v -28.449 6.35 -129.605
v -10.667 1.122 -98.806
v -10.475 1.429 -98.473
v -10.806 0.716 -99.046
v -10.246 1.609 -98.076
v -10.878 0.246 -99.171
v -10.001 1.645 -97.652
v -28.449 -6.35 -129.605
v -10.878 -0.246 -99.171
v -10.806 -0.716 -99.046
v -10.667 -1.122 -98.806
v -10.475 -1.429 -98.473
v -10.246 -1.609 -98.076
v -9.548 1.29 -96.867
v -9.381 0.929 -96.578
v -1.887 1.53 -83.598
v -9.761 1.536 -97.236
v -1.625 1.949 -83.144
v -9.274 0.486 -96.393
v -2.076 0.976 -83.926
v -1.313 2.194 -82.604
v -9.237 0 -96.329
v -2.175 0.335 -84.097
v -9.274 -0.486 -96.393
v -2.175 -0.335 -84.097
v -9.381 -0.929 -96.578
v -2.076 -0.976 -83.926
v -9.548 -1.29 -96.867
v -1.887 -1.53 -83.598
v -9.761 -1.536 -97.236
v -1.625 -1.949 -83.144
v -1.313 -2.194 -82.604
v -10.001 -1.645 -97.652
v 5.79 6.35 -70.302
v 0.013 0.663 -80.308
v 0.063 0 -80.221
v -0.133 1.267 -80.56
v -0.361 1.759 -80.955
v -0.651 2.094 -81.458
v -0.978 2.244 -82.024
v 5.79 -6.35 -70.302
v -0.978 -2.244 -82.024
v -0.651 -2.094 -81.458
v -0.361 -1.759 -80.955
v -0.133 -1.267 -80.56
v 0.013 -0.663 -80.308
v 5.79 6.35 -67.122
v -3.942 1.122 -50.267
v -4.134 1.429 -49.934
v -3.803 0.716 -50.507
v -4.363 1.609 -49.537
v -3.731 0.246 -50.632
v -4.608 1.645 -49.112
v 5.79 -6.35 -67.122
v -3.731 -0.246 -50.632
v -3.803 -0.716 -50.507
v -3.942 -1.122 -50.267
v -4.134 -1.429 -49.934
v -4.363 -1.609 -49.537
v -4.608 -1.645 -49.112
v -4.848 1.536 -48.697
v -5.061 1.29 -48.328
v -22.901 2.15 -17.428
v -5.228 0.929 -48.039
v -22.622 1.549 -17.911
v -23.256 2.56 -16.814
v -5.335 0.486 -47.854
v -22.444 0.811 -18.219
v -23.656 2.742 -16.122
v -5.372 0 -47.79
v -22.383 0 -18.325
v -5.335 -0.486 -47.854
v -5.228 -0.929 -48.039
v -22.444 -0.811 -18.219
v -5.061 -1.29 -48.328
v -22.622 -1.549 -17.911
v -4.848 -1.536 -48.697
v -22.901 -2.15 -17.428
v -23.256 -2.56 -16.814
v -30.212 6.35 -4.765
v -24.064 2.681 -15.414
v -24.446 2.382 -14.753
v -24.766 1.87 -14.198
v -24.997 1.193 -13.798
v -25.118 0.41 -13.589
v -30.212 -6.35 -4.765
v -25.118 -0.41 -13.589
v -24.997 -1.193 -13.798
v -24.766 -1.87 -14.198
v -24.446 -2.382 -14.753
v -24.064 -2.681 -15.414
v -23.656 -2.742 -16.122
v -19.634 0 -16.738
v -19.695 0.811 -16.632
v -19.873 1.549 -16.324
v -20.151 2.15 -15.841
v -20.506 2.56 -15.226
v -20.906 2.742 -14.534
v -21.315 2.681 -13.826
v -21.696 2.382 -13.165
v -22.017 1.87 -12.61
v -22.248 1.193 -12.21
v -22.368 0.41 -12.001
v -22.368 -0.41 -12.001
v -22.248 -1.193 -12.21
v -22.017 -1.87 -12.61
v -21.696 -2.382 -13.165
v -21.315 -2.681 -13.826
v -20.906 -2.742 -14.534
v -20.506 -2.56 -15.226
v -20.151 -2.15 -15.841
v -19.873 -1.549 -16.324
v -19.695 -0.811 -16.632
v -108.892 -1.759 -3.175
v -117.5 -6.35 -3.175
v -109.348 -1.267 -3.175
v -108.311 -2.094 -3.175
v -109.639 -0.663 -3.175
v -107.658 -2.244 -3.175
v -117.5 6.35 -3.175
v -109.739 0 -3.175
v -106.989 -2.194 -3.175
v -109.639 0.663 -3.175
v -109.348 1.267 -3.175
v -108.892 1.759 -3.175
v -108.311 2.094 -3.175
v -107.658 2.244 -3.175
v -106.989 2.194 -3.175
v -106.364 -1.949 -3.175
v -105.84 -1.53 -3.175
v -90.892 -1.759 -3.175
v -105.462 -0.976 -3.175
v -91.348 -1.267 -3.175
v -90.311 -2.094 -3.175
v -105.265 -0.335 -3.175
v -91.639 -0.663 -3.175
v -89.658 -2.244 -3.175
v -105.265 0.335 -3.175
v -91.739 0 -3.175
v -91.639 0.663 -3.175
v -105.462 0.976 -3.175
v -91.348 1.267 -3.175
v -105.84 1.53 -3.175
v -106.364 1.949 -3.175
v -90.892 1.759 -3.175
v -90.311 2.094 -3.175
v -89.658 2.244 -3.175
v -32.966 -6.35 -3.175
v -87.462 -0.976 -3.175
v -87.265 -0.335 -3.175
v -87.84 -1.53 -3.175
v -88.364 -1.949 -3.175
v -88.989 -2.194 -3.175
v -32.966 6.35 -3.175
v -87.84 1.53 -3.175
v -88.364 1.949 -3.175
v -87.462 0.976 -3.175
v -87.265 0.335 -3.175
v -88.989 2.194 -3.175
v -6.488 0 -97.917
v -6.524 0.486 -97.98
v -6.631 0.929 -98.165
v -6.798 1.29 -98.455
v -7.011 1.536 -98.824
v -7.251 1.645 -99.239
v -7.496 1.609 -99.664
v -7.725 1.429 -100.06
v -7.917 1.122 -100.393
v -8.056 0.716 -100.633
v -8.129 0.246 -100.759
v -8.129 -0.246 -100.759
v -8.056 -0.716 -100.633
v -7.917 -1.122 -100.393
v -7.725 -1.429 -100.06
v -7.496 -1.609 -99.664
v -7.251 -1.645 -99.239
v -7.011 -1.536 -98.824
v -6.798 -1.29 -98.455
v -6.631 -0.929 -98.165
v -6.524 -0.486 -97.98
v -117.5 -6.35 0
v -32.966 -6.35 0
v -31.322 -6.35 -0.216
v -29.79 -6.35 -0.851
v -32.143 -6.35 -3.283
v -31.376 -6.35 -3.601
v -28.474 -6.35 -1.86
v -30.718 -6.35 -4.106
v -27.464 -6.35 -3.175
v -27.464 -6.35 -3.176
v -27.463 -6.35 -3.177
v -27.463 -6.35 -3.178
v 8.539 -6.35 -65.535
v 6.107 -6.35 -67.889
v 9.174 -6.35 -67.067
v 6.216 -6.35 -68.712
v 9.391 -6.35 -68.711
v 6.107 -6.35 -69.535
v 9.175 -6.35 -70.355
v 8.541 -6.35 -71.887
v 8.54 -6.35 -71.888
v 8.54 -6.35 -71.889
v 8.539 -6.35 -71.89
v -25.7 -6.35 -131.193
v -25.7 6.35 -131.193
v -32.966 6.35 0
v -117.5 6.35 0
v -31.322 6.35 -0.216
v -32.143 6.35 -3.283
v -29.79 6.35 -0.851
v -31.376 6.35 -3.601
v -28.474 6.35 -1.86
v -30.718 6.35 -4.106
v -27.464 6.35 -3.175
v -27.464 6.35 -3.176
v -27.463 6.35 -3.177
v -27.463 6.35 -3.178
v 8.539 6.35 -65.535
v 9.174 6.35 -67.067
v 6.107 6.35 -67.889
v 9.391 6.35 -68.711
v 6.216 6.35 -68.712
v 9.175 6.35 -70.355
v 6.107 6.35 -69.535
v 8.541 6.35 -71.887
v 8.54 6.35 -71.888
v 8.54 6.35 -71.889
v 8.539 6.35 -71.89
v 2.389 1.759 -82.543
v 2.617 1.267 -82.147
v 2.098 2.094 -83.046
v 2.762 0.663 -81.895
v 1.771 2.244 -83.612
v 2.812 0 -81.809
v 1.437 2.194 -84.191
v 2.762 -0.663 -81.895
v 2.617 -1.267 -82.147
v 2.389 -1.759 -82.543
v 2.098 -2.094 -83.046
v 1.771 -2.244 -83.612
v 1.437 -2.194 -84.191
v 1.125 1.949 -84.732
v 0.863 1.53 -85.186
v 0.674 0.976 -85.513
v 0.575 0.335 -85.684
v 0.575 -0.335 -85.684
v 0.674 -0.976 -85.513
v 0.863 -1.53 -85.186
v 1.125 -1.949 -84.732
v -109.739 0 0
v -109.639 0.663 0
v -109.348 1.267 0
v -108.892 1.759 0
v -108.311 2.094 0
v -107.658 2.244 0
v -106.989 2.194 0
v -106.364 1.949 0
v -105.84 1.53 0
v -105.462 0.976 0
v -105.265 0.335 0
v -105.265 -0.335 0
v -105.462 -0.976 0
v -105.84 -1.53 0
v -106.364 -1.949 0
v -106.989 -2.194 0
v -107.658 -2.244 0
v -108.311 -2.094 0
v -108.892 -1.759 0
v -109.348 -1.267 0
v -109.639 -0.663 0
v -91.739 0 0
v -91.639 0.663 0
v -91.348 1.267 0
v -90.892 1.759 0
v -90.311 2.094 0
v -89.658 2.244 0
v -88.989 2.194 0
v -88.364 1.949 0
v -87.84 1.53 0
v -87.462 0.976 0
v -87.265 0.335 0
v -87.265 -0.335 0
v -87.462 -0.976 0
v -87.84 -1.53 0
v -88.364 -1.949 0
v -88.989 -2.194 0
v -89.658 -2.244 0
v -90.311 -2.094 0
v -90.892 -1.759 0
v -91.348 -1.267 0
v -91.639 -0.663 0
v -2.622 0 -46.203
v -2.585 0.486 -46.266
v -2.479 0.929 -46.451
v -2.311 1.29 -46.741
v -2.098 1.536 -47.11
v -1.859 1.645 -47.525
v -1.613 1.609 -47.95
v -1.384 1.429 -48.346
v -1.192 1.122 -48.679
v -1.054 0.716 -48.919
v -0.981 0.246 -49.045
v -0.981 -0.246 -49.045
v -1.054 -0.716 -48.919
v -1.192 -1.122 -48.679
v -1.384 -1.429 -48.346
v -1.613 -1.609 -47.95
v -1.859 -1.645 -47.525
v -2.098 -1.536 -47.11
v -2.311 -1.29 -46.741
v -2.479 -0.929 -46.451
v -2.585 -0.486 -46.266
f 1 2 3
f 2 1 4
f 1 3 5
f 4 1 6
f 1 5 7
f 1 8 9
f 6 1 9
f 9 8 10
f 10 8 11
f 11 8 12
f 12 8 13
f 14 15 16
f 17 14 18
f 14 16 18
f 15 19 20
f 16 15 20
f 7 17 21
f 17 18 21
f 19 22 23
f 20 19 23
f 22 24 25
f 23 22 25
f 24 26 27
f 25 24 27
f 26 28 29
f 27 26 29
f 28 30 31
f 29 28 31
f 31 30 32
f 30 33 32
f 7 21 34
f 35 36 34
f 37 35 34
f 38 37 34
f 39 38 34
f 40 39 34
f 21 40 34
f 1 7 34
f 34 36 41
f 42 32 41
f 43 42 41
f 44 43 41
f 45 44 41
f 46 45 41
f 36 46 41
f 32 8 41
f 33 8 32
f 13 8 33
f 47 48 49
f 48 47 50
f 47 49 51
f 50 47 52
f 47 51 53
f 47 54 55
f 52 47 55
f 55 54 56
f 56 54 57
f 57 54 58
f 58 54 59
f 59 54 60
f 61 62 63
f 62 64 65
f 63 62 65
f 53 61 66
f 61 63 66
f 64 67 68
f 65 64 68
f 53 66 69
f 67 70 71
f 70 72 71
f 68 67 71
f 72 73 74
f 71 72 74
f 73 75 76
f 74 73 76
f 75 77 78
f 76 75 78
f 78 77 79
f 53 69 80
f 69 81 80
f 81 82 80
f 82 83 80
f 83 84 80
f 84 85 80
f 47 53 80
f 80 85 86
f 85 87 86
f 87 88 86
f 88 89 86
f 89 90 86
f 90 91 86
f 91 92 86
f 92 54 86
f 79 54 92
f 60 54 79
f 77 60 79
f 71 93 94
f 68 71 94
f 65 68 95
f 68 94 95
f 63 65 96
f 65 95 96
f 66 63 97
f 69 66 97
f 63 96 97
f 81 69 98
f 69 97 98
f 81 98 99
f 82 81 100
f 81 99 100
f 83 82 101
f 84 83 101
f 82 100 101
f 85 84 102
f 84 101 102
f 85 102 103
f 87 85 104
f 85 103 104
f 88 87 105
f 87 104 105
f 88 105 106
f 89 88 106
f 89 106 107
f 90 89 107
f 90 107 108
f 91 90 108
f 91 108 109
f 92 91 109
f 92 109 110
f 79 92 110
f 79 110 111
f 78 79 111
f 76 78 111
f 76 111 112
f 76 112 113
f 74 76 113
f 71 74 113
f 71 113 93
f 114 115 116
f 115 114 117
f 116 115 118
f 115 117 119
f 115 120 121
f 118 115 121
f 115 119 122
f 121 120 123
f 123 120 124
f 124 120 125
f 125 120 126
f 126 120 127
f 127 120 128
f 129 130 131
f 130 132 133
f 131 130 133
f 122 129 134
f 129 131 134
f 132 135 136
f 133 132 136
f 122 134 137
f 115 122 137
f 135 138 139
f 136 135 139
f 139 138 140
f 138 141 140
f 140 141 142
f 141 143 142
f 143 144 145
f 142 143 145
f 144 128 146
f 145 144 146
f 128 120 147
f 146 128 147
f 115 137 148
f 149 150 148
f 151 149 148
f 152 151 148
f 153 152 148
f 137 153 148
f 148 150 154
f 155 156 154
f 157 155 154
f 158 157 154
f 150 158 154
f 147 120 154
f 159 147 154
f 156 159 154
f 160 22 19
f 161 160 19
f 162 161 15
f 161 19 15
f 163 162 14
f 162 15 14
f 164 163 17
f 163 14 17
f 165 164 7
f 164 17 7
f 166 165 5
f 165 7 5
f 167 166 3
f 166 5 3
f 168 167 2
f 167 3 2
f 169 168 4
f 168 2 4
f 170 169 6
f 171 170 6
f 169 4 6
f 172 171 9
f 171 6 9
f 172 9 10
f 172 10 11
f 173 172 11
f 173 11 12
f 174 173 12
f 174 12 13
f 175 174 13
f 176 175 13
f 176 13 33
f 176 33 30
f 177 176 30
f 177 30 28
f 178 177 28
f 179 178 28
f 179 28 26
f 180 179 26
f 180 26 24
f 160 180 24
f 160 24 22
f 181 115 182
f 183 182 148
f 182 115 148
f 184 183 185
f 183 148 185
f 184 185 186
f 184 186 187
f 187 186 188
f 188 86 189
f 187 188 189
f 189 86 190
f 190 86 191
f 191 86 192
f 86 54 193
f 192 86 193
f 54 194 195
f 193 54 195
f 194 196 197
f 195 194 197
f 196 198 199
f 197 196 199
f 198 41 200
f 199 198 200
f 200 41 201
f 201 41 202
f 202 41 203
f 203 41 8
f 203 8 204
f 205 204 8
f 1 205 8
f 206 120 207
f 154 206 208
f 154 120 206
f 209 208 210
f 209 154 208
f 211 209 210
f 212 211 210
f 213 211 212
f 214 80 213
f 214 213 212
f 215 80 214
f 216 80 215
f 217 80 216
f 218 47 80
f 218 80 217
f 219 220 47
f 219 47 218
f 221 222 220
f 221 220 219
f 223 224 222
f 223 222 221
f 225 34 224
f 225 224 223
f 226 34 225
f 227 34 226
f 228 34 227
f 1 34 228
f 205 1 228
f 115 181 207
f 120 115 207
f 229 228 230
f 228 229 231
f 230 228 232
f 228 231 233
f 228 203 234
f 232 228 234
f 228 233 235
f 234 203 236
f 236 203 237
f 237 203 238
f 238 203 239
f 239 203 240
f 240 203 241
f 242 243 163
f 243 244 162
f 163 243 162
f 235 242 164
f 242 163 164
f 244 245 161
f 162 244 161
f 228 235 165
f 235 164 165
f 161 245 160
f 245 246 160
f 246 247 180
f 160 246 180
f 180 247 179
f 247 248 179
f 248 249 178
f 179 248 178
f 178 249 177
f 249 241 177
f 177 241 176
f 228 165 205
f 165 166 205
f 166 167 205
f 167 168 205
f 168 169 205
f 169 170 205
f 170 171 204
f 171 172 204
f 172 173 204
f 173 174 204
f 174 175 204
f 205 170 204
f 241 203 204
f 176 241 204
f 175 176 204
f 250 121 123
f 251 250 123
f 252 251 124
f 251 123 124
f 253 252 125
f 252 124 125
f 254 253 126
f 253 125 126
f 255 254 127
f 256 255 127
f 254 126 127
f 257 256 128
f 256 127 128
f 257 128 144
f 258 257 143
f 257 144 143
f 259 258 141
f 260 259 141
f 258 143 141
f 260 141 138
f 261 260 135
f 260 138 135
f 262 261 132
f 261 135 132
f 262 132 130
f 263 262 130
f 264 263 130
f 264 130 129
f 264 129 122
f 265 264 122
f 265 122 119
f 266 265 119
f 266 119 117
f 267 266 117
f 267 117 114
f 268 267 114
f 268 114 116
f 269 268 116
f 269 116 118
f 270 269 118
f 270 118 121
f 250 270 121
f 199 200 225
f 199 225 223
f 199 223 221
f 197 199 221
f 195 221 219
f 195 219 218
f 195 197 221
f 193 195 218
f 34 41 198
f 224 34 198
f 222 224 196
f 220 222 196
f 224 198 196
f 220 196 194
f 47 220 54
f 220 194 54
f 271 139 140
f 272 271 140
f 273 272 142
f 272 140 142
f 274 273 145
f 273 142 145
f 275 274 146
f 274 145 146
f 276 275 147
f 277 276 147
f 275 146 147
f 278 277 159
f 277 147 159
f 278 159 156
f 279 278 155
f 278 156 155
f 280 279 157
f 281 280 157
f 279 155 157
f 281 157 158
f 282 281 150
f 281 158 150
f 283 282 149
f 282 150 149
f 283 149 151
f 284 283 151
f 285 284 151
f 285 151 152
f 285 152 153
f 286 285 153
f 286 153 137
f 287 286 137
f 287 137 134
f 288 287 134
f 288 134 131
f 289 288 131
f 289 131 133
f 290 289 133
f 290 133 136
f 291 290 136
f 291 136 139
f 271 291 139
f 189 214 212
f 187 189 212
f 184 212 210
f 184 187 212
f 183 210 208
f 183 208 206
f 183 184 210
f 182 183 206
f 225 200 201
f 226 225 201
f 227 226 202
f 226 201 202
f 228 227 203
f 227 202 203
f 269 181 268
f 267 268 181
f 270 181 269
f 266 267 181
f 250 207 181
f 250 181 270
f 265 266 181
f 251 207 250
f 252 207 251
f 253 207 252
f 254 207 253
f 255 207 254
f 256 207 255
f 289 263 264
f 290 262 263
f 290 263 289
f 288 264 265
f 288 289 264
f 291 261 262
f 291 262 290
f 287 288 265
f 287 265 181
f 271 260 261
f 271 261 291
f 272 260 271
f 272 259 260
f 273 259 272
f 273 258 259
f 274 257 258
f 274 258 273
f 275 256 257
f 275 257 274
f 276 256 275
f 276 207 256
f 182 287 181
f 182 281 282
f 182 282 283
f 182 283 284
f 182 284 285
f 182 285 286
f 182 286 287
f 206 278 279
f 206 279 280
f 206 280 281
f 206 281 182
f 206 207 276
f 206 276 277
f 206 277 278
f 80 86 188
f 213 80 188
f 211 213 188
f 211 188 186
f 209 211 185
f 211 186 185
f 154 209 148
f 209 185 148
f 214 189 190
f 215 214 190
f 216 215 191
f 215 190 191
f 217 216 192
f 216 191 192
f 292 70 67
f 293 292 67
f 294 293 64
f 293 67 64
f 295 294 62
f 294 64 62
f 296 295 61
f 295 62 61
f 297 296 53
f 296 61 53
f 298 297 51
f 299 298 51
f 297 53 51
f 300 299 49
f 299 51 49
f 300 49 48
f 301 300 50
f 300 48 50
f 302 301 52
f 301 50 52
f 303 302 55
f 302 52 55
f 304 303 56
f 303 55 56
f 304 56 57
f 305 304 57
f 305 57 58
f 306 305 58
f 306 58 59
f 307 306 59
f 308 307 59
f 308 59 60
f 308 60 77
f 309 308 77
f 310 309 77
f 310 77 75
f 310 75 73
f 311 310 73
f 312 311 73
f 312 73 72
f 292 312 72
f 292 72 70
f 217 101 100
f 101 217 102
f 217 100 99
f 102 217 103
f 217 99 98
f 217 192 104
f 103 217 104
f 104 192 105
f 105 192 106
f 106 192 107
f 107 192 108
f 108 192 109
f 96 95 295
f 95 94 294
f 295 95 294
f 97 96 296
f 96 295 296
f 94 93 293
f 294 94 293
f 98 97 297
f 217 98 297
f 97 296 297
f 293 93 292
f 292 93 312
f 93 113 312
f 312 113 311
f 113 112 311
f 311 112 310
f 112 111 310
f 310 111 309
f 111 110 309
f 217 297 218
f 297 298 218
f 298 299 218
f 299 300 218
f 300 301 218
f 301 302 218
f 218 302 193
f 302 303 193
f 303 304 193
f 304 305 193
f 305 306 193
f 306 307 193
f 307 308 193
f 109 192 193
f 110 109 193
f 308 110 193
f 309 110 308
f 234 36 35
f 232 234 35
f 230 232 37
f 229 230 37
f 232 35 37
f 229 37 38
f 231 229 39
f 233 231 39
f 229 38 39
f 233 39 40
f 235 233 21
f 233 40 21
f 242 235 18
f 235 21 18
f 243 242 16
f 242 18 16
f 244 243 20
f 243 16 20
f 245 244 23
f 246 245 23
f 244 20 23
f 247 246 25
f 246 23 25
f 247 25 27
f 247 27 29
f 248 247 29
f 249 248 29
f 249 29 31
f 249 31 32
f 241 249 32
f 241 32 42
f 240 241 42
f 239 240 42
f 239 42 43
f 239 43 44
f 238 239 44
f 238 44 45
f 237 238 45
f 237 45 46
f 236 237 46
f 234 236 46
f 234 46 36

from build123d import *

# Parameters (mm, degrees)
ESBO_O2_W               = 235
ESBO_O2_H               = 12.7
FLANGE_BASE1_DEPTH      = 3.175
DOBRA_START             = -6.35
DOBRA_ESBO_ADA1_DEPTH   = 12.7
DOBRA_ESBO_ADA1_2_DEPTH = 12.7
DOBRA_ESBO_ADA2_DEPTH   = 12.7
DOBRA_ESBO_ADA2_2_DEPTH = 12.7
ESBO_O11_R              = 2.250000001
CORTE_EXTRUS_O1_DEPTH   = 10
ESBO_O13_R              = 2.750000001
CORTE_EXTRUS_O3_DEPTH   = 10
ESBO_O16_R              = 2.25
CORTE_EXTRUS_O5_DEPTH   = 10
ESBO_O17_R              = 2.25
ESBO_O17_R_2            = 1.65
CORTE_EXTRUS_O6_DEPTH   = 10
ESBO_O18_R              = 1.650000002
CORTE_EXTRUS_O7_DEPTH   = 10


# Read off the part's stored shape, not the designer's step: Dobra esboçada1, Dobra esboçada2
# Sheet-metal steps are written as plain solids
with BuildPart() as part:
    # Esboço2 → Flange-base1 (new body)
    with BuildSketch(Plane.XY):
        Rectangle(ESBO_O2_W, ESBO_O2_H)
    extrude(amount=-FLANGE_BASE1_DEPTH)

    # Dobra esboçada1 outline → Dobra esboçada1 (cut)
    with BuildSketch(Plane(origin=(0, 0, 0), x_dir=(1, 0, 0), z_dir=(0, 1, 0)).offset(DOBRA_START)):
        with BuildLine():
            Line((117.5, 3.175), (-27.464109855, 3.175))
            ThreePointArc((-27.464109855, 3.175), (-29.790007409, 0.850686918), (-32.966257163, 0))
            Line((-32.966257163, 0), (117.5, 0))
            Line((117.5, 0), (117.5, 3.175))
        make_face()
    extrude(amount=DOBRA_ESBO_ADA1_DEPTH, mode=Mode.SUBTRACT)

    # Dobra esbo_ada1 2 outline → Dobra esbo_ada1 2 (add)
    with BuildSketch(Plane(origin=(0, 0, 0), x_dir=(1, 0, 0), z_dir=(0, 1, 0)).offset(DOBRA_START)):
        with BuildLine():
            Line((45.274205697, 129.161456881), (42.52457504, 130.748956881))
            Line((42.52457504, 130.748956881), (-30.212296379, 4.765))
            ThreePointArc((-30.212296379, 4.765), (-31.376257163, 3.601039216), (-32.966257163, 3.175))
            Line((-32.966257163, 3.175), (-27.464109855, 3.175))
            ThreePointArc((-27.464109855, 3.175), (-27.463387647, 3.176249918), (-27.462665722, 3.1775))
            Line((-27.462665722, 3.1775), (45.274205697, 129.161456881))
        make_face()
    extrude(amount=DOBRA_ESBO_ADA1_2_DEPTH)

    # Dobra esboçada2 outline → Dobra esboçada2 (cut)
    with BuildSketch(Plane(origin=(0, 0, 0), x_dir=(1, 0, 0), z_dir=(0, 1, 0)).offset(DOBRA_START)):
        with BuildLine():
            Line((42.52457504, 130.748956881), (8.540648694, 71.887069809))
            ThreePointArc((8.540648694, 71.887069809), (9.390614092, 68.7106269), (8.539205697, 65.534570465))
            Line((8.539205697, 65.534570465), (45.274205697, 129.161456881))
            Line((45.274205697, 129.161456881), (42.52457504, 130.748956881))
        make_face()
    extrude(amount=DOBRA_ESBO_ADA2_DEPTH, mode=Mode.SUBTRACT)

    # Dobra esbo_ada2 2 outline → Dobra esbo_ada2 2 (add)
    with BuildSketch(Plane(origin=(0, 0, 0), x_dir=(1, 0, 0), z_dir=(0, 1, 0)).offset(DOBRA_START)):
        with BuildLine():
            Line((-28.449167797, 129.605312646), (5.78957504, 70.302070465))
            ThreePointArc((5.78957504, 70.302070465), (6.215614256, 68.712070465), (5.78957504, 67.122070465))
            Line((5.78957504, 67.122070465), (8.540648694, 71.887069809))
            ThreePointArc((8.540648694, 71.887069809), (8.539927338, 71.888320219), (8.539205697, 71.889570465))
            Line((8.539205697, 71.889570465), (-25.69953714, 131.192812646))
            Line((-25.69953714, 131.192812646), (-28.449167797, 129.605312646))
        make_face()
    extrude(amount=DOBRA_ESBO_ADA2_2_DEPTH)

    # Esboço11 → Corte-extrusão1 (cut)
    with BuildSketch(Plane(origin=(0, 0, -3.175), x_dir=(-1, 0, 0), z_dir=(0, 0, -1))):
        with Locations((89.489373825, 0)):
            Circle(ESBO_O11_R)
    extrude(amount=-CORTE_EXTRUS_O1_DEPTH, mode=Mode.SUBTRACT)

    # Esboço13 → Corte-extrusão3 (cut)
    with BuildSketch(Plane(origin=(-21.972897151, 0, -12.686058085), x_dir=(0.49999999999999806, 0, -0.8660254037844398), z_dir=(0.8660254037844397, 0, 0.499999999999998))):
        with Locations((1.928330412, 0)):
            Circle(ESBO_O13_R)
    extrude(amount=-CORTE_EXTRUS_O3_DEPTH, mode=Mode.SUBTRACT)

    # Esboço16 → Corte-extrusão5 (cut)
    with BuildSketch(Plane(origin=(0, 0, -3.175), x_dir=(-1, 0, 0), z_dir=(0, 0, -1))):
        with Locations((107.489373825, 0)):
            Circle(ESBO_O16_R)
    extrude(amount=-CORTE_EXTRUS_O5_DEPTH, mode=Mode.SUBTRACT)

    # Esboço17 → Corte-extrusão6 (cut)
    with BuildSketch(Plane(origin=(34.783870761, 0, -20.082477147), x_dir=(0.5000000000000041, 0, 0.8660254037844364), z_dir=(-0.8660254037844363, 0, 0.500000000000004))):
        with Locations((-71.692454523, 0)):
            Circle(ESBO_O17_R)
        with Locations((-89.692454522, 0)):
            Circle(ESBO_O17_R_2)
    extrude(amount=-CORTE_EXTRUS_O6_DEPTH, mode=Mode.SUBTRACT)

    # Esboço18 → Corte-extrusão7 (cut)
    with BuildSketch(Plane(origin=(-24.722527808, 0, -14.273558085), x_dir=(-0.49999999999999806, 0, 0.8660254037844398), z_dir=(-0.8660254037844397, 0, -0.499999999999998))):
        with Locations((-40.351796828, 0)):
            Circle(ESBO_O18_R)
    extrude(amount=-CORTE_EXTRUS_O7_DEPTH, mode=Mode.SUBTRACT)


solid = part.part
